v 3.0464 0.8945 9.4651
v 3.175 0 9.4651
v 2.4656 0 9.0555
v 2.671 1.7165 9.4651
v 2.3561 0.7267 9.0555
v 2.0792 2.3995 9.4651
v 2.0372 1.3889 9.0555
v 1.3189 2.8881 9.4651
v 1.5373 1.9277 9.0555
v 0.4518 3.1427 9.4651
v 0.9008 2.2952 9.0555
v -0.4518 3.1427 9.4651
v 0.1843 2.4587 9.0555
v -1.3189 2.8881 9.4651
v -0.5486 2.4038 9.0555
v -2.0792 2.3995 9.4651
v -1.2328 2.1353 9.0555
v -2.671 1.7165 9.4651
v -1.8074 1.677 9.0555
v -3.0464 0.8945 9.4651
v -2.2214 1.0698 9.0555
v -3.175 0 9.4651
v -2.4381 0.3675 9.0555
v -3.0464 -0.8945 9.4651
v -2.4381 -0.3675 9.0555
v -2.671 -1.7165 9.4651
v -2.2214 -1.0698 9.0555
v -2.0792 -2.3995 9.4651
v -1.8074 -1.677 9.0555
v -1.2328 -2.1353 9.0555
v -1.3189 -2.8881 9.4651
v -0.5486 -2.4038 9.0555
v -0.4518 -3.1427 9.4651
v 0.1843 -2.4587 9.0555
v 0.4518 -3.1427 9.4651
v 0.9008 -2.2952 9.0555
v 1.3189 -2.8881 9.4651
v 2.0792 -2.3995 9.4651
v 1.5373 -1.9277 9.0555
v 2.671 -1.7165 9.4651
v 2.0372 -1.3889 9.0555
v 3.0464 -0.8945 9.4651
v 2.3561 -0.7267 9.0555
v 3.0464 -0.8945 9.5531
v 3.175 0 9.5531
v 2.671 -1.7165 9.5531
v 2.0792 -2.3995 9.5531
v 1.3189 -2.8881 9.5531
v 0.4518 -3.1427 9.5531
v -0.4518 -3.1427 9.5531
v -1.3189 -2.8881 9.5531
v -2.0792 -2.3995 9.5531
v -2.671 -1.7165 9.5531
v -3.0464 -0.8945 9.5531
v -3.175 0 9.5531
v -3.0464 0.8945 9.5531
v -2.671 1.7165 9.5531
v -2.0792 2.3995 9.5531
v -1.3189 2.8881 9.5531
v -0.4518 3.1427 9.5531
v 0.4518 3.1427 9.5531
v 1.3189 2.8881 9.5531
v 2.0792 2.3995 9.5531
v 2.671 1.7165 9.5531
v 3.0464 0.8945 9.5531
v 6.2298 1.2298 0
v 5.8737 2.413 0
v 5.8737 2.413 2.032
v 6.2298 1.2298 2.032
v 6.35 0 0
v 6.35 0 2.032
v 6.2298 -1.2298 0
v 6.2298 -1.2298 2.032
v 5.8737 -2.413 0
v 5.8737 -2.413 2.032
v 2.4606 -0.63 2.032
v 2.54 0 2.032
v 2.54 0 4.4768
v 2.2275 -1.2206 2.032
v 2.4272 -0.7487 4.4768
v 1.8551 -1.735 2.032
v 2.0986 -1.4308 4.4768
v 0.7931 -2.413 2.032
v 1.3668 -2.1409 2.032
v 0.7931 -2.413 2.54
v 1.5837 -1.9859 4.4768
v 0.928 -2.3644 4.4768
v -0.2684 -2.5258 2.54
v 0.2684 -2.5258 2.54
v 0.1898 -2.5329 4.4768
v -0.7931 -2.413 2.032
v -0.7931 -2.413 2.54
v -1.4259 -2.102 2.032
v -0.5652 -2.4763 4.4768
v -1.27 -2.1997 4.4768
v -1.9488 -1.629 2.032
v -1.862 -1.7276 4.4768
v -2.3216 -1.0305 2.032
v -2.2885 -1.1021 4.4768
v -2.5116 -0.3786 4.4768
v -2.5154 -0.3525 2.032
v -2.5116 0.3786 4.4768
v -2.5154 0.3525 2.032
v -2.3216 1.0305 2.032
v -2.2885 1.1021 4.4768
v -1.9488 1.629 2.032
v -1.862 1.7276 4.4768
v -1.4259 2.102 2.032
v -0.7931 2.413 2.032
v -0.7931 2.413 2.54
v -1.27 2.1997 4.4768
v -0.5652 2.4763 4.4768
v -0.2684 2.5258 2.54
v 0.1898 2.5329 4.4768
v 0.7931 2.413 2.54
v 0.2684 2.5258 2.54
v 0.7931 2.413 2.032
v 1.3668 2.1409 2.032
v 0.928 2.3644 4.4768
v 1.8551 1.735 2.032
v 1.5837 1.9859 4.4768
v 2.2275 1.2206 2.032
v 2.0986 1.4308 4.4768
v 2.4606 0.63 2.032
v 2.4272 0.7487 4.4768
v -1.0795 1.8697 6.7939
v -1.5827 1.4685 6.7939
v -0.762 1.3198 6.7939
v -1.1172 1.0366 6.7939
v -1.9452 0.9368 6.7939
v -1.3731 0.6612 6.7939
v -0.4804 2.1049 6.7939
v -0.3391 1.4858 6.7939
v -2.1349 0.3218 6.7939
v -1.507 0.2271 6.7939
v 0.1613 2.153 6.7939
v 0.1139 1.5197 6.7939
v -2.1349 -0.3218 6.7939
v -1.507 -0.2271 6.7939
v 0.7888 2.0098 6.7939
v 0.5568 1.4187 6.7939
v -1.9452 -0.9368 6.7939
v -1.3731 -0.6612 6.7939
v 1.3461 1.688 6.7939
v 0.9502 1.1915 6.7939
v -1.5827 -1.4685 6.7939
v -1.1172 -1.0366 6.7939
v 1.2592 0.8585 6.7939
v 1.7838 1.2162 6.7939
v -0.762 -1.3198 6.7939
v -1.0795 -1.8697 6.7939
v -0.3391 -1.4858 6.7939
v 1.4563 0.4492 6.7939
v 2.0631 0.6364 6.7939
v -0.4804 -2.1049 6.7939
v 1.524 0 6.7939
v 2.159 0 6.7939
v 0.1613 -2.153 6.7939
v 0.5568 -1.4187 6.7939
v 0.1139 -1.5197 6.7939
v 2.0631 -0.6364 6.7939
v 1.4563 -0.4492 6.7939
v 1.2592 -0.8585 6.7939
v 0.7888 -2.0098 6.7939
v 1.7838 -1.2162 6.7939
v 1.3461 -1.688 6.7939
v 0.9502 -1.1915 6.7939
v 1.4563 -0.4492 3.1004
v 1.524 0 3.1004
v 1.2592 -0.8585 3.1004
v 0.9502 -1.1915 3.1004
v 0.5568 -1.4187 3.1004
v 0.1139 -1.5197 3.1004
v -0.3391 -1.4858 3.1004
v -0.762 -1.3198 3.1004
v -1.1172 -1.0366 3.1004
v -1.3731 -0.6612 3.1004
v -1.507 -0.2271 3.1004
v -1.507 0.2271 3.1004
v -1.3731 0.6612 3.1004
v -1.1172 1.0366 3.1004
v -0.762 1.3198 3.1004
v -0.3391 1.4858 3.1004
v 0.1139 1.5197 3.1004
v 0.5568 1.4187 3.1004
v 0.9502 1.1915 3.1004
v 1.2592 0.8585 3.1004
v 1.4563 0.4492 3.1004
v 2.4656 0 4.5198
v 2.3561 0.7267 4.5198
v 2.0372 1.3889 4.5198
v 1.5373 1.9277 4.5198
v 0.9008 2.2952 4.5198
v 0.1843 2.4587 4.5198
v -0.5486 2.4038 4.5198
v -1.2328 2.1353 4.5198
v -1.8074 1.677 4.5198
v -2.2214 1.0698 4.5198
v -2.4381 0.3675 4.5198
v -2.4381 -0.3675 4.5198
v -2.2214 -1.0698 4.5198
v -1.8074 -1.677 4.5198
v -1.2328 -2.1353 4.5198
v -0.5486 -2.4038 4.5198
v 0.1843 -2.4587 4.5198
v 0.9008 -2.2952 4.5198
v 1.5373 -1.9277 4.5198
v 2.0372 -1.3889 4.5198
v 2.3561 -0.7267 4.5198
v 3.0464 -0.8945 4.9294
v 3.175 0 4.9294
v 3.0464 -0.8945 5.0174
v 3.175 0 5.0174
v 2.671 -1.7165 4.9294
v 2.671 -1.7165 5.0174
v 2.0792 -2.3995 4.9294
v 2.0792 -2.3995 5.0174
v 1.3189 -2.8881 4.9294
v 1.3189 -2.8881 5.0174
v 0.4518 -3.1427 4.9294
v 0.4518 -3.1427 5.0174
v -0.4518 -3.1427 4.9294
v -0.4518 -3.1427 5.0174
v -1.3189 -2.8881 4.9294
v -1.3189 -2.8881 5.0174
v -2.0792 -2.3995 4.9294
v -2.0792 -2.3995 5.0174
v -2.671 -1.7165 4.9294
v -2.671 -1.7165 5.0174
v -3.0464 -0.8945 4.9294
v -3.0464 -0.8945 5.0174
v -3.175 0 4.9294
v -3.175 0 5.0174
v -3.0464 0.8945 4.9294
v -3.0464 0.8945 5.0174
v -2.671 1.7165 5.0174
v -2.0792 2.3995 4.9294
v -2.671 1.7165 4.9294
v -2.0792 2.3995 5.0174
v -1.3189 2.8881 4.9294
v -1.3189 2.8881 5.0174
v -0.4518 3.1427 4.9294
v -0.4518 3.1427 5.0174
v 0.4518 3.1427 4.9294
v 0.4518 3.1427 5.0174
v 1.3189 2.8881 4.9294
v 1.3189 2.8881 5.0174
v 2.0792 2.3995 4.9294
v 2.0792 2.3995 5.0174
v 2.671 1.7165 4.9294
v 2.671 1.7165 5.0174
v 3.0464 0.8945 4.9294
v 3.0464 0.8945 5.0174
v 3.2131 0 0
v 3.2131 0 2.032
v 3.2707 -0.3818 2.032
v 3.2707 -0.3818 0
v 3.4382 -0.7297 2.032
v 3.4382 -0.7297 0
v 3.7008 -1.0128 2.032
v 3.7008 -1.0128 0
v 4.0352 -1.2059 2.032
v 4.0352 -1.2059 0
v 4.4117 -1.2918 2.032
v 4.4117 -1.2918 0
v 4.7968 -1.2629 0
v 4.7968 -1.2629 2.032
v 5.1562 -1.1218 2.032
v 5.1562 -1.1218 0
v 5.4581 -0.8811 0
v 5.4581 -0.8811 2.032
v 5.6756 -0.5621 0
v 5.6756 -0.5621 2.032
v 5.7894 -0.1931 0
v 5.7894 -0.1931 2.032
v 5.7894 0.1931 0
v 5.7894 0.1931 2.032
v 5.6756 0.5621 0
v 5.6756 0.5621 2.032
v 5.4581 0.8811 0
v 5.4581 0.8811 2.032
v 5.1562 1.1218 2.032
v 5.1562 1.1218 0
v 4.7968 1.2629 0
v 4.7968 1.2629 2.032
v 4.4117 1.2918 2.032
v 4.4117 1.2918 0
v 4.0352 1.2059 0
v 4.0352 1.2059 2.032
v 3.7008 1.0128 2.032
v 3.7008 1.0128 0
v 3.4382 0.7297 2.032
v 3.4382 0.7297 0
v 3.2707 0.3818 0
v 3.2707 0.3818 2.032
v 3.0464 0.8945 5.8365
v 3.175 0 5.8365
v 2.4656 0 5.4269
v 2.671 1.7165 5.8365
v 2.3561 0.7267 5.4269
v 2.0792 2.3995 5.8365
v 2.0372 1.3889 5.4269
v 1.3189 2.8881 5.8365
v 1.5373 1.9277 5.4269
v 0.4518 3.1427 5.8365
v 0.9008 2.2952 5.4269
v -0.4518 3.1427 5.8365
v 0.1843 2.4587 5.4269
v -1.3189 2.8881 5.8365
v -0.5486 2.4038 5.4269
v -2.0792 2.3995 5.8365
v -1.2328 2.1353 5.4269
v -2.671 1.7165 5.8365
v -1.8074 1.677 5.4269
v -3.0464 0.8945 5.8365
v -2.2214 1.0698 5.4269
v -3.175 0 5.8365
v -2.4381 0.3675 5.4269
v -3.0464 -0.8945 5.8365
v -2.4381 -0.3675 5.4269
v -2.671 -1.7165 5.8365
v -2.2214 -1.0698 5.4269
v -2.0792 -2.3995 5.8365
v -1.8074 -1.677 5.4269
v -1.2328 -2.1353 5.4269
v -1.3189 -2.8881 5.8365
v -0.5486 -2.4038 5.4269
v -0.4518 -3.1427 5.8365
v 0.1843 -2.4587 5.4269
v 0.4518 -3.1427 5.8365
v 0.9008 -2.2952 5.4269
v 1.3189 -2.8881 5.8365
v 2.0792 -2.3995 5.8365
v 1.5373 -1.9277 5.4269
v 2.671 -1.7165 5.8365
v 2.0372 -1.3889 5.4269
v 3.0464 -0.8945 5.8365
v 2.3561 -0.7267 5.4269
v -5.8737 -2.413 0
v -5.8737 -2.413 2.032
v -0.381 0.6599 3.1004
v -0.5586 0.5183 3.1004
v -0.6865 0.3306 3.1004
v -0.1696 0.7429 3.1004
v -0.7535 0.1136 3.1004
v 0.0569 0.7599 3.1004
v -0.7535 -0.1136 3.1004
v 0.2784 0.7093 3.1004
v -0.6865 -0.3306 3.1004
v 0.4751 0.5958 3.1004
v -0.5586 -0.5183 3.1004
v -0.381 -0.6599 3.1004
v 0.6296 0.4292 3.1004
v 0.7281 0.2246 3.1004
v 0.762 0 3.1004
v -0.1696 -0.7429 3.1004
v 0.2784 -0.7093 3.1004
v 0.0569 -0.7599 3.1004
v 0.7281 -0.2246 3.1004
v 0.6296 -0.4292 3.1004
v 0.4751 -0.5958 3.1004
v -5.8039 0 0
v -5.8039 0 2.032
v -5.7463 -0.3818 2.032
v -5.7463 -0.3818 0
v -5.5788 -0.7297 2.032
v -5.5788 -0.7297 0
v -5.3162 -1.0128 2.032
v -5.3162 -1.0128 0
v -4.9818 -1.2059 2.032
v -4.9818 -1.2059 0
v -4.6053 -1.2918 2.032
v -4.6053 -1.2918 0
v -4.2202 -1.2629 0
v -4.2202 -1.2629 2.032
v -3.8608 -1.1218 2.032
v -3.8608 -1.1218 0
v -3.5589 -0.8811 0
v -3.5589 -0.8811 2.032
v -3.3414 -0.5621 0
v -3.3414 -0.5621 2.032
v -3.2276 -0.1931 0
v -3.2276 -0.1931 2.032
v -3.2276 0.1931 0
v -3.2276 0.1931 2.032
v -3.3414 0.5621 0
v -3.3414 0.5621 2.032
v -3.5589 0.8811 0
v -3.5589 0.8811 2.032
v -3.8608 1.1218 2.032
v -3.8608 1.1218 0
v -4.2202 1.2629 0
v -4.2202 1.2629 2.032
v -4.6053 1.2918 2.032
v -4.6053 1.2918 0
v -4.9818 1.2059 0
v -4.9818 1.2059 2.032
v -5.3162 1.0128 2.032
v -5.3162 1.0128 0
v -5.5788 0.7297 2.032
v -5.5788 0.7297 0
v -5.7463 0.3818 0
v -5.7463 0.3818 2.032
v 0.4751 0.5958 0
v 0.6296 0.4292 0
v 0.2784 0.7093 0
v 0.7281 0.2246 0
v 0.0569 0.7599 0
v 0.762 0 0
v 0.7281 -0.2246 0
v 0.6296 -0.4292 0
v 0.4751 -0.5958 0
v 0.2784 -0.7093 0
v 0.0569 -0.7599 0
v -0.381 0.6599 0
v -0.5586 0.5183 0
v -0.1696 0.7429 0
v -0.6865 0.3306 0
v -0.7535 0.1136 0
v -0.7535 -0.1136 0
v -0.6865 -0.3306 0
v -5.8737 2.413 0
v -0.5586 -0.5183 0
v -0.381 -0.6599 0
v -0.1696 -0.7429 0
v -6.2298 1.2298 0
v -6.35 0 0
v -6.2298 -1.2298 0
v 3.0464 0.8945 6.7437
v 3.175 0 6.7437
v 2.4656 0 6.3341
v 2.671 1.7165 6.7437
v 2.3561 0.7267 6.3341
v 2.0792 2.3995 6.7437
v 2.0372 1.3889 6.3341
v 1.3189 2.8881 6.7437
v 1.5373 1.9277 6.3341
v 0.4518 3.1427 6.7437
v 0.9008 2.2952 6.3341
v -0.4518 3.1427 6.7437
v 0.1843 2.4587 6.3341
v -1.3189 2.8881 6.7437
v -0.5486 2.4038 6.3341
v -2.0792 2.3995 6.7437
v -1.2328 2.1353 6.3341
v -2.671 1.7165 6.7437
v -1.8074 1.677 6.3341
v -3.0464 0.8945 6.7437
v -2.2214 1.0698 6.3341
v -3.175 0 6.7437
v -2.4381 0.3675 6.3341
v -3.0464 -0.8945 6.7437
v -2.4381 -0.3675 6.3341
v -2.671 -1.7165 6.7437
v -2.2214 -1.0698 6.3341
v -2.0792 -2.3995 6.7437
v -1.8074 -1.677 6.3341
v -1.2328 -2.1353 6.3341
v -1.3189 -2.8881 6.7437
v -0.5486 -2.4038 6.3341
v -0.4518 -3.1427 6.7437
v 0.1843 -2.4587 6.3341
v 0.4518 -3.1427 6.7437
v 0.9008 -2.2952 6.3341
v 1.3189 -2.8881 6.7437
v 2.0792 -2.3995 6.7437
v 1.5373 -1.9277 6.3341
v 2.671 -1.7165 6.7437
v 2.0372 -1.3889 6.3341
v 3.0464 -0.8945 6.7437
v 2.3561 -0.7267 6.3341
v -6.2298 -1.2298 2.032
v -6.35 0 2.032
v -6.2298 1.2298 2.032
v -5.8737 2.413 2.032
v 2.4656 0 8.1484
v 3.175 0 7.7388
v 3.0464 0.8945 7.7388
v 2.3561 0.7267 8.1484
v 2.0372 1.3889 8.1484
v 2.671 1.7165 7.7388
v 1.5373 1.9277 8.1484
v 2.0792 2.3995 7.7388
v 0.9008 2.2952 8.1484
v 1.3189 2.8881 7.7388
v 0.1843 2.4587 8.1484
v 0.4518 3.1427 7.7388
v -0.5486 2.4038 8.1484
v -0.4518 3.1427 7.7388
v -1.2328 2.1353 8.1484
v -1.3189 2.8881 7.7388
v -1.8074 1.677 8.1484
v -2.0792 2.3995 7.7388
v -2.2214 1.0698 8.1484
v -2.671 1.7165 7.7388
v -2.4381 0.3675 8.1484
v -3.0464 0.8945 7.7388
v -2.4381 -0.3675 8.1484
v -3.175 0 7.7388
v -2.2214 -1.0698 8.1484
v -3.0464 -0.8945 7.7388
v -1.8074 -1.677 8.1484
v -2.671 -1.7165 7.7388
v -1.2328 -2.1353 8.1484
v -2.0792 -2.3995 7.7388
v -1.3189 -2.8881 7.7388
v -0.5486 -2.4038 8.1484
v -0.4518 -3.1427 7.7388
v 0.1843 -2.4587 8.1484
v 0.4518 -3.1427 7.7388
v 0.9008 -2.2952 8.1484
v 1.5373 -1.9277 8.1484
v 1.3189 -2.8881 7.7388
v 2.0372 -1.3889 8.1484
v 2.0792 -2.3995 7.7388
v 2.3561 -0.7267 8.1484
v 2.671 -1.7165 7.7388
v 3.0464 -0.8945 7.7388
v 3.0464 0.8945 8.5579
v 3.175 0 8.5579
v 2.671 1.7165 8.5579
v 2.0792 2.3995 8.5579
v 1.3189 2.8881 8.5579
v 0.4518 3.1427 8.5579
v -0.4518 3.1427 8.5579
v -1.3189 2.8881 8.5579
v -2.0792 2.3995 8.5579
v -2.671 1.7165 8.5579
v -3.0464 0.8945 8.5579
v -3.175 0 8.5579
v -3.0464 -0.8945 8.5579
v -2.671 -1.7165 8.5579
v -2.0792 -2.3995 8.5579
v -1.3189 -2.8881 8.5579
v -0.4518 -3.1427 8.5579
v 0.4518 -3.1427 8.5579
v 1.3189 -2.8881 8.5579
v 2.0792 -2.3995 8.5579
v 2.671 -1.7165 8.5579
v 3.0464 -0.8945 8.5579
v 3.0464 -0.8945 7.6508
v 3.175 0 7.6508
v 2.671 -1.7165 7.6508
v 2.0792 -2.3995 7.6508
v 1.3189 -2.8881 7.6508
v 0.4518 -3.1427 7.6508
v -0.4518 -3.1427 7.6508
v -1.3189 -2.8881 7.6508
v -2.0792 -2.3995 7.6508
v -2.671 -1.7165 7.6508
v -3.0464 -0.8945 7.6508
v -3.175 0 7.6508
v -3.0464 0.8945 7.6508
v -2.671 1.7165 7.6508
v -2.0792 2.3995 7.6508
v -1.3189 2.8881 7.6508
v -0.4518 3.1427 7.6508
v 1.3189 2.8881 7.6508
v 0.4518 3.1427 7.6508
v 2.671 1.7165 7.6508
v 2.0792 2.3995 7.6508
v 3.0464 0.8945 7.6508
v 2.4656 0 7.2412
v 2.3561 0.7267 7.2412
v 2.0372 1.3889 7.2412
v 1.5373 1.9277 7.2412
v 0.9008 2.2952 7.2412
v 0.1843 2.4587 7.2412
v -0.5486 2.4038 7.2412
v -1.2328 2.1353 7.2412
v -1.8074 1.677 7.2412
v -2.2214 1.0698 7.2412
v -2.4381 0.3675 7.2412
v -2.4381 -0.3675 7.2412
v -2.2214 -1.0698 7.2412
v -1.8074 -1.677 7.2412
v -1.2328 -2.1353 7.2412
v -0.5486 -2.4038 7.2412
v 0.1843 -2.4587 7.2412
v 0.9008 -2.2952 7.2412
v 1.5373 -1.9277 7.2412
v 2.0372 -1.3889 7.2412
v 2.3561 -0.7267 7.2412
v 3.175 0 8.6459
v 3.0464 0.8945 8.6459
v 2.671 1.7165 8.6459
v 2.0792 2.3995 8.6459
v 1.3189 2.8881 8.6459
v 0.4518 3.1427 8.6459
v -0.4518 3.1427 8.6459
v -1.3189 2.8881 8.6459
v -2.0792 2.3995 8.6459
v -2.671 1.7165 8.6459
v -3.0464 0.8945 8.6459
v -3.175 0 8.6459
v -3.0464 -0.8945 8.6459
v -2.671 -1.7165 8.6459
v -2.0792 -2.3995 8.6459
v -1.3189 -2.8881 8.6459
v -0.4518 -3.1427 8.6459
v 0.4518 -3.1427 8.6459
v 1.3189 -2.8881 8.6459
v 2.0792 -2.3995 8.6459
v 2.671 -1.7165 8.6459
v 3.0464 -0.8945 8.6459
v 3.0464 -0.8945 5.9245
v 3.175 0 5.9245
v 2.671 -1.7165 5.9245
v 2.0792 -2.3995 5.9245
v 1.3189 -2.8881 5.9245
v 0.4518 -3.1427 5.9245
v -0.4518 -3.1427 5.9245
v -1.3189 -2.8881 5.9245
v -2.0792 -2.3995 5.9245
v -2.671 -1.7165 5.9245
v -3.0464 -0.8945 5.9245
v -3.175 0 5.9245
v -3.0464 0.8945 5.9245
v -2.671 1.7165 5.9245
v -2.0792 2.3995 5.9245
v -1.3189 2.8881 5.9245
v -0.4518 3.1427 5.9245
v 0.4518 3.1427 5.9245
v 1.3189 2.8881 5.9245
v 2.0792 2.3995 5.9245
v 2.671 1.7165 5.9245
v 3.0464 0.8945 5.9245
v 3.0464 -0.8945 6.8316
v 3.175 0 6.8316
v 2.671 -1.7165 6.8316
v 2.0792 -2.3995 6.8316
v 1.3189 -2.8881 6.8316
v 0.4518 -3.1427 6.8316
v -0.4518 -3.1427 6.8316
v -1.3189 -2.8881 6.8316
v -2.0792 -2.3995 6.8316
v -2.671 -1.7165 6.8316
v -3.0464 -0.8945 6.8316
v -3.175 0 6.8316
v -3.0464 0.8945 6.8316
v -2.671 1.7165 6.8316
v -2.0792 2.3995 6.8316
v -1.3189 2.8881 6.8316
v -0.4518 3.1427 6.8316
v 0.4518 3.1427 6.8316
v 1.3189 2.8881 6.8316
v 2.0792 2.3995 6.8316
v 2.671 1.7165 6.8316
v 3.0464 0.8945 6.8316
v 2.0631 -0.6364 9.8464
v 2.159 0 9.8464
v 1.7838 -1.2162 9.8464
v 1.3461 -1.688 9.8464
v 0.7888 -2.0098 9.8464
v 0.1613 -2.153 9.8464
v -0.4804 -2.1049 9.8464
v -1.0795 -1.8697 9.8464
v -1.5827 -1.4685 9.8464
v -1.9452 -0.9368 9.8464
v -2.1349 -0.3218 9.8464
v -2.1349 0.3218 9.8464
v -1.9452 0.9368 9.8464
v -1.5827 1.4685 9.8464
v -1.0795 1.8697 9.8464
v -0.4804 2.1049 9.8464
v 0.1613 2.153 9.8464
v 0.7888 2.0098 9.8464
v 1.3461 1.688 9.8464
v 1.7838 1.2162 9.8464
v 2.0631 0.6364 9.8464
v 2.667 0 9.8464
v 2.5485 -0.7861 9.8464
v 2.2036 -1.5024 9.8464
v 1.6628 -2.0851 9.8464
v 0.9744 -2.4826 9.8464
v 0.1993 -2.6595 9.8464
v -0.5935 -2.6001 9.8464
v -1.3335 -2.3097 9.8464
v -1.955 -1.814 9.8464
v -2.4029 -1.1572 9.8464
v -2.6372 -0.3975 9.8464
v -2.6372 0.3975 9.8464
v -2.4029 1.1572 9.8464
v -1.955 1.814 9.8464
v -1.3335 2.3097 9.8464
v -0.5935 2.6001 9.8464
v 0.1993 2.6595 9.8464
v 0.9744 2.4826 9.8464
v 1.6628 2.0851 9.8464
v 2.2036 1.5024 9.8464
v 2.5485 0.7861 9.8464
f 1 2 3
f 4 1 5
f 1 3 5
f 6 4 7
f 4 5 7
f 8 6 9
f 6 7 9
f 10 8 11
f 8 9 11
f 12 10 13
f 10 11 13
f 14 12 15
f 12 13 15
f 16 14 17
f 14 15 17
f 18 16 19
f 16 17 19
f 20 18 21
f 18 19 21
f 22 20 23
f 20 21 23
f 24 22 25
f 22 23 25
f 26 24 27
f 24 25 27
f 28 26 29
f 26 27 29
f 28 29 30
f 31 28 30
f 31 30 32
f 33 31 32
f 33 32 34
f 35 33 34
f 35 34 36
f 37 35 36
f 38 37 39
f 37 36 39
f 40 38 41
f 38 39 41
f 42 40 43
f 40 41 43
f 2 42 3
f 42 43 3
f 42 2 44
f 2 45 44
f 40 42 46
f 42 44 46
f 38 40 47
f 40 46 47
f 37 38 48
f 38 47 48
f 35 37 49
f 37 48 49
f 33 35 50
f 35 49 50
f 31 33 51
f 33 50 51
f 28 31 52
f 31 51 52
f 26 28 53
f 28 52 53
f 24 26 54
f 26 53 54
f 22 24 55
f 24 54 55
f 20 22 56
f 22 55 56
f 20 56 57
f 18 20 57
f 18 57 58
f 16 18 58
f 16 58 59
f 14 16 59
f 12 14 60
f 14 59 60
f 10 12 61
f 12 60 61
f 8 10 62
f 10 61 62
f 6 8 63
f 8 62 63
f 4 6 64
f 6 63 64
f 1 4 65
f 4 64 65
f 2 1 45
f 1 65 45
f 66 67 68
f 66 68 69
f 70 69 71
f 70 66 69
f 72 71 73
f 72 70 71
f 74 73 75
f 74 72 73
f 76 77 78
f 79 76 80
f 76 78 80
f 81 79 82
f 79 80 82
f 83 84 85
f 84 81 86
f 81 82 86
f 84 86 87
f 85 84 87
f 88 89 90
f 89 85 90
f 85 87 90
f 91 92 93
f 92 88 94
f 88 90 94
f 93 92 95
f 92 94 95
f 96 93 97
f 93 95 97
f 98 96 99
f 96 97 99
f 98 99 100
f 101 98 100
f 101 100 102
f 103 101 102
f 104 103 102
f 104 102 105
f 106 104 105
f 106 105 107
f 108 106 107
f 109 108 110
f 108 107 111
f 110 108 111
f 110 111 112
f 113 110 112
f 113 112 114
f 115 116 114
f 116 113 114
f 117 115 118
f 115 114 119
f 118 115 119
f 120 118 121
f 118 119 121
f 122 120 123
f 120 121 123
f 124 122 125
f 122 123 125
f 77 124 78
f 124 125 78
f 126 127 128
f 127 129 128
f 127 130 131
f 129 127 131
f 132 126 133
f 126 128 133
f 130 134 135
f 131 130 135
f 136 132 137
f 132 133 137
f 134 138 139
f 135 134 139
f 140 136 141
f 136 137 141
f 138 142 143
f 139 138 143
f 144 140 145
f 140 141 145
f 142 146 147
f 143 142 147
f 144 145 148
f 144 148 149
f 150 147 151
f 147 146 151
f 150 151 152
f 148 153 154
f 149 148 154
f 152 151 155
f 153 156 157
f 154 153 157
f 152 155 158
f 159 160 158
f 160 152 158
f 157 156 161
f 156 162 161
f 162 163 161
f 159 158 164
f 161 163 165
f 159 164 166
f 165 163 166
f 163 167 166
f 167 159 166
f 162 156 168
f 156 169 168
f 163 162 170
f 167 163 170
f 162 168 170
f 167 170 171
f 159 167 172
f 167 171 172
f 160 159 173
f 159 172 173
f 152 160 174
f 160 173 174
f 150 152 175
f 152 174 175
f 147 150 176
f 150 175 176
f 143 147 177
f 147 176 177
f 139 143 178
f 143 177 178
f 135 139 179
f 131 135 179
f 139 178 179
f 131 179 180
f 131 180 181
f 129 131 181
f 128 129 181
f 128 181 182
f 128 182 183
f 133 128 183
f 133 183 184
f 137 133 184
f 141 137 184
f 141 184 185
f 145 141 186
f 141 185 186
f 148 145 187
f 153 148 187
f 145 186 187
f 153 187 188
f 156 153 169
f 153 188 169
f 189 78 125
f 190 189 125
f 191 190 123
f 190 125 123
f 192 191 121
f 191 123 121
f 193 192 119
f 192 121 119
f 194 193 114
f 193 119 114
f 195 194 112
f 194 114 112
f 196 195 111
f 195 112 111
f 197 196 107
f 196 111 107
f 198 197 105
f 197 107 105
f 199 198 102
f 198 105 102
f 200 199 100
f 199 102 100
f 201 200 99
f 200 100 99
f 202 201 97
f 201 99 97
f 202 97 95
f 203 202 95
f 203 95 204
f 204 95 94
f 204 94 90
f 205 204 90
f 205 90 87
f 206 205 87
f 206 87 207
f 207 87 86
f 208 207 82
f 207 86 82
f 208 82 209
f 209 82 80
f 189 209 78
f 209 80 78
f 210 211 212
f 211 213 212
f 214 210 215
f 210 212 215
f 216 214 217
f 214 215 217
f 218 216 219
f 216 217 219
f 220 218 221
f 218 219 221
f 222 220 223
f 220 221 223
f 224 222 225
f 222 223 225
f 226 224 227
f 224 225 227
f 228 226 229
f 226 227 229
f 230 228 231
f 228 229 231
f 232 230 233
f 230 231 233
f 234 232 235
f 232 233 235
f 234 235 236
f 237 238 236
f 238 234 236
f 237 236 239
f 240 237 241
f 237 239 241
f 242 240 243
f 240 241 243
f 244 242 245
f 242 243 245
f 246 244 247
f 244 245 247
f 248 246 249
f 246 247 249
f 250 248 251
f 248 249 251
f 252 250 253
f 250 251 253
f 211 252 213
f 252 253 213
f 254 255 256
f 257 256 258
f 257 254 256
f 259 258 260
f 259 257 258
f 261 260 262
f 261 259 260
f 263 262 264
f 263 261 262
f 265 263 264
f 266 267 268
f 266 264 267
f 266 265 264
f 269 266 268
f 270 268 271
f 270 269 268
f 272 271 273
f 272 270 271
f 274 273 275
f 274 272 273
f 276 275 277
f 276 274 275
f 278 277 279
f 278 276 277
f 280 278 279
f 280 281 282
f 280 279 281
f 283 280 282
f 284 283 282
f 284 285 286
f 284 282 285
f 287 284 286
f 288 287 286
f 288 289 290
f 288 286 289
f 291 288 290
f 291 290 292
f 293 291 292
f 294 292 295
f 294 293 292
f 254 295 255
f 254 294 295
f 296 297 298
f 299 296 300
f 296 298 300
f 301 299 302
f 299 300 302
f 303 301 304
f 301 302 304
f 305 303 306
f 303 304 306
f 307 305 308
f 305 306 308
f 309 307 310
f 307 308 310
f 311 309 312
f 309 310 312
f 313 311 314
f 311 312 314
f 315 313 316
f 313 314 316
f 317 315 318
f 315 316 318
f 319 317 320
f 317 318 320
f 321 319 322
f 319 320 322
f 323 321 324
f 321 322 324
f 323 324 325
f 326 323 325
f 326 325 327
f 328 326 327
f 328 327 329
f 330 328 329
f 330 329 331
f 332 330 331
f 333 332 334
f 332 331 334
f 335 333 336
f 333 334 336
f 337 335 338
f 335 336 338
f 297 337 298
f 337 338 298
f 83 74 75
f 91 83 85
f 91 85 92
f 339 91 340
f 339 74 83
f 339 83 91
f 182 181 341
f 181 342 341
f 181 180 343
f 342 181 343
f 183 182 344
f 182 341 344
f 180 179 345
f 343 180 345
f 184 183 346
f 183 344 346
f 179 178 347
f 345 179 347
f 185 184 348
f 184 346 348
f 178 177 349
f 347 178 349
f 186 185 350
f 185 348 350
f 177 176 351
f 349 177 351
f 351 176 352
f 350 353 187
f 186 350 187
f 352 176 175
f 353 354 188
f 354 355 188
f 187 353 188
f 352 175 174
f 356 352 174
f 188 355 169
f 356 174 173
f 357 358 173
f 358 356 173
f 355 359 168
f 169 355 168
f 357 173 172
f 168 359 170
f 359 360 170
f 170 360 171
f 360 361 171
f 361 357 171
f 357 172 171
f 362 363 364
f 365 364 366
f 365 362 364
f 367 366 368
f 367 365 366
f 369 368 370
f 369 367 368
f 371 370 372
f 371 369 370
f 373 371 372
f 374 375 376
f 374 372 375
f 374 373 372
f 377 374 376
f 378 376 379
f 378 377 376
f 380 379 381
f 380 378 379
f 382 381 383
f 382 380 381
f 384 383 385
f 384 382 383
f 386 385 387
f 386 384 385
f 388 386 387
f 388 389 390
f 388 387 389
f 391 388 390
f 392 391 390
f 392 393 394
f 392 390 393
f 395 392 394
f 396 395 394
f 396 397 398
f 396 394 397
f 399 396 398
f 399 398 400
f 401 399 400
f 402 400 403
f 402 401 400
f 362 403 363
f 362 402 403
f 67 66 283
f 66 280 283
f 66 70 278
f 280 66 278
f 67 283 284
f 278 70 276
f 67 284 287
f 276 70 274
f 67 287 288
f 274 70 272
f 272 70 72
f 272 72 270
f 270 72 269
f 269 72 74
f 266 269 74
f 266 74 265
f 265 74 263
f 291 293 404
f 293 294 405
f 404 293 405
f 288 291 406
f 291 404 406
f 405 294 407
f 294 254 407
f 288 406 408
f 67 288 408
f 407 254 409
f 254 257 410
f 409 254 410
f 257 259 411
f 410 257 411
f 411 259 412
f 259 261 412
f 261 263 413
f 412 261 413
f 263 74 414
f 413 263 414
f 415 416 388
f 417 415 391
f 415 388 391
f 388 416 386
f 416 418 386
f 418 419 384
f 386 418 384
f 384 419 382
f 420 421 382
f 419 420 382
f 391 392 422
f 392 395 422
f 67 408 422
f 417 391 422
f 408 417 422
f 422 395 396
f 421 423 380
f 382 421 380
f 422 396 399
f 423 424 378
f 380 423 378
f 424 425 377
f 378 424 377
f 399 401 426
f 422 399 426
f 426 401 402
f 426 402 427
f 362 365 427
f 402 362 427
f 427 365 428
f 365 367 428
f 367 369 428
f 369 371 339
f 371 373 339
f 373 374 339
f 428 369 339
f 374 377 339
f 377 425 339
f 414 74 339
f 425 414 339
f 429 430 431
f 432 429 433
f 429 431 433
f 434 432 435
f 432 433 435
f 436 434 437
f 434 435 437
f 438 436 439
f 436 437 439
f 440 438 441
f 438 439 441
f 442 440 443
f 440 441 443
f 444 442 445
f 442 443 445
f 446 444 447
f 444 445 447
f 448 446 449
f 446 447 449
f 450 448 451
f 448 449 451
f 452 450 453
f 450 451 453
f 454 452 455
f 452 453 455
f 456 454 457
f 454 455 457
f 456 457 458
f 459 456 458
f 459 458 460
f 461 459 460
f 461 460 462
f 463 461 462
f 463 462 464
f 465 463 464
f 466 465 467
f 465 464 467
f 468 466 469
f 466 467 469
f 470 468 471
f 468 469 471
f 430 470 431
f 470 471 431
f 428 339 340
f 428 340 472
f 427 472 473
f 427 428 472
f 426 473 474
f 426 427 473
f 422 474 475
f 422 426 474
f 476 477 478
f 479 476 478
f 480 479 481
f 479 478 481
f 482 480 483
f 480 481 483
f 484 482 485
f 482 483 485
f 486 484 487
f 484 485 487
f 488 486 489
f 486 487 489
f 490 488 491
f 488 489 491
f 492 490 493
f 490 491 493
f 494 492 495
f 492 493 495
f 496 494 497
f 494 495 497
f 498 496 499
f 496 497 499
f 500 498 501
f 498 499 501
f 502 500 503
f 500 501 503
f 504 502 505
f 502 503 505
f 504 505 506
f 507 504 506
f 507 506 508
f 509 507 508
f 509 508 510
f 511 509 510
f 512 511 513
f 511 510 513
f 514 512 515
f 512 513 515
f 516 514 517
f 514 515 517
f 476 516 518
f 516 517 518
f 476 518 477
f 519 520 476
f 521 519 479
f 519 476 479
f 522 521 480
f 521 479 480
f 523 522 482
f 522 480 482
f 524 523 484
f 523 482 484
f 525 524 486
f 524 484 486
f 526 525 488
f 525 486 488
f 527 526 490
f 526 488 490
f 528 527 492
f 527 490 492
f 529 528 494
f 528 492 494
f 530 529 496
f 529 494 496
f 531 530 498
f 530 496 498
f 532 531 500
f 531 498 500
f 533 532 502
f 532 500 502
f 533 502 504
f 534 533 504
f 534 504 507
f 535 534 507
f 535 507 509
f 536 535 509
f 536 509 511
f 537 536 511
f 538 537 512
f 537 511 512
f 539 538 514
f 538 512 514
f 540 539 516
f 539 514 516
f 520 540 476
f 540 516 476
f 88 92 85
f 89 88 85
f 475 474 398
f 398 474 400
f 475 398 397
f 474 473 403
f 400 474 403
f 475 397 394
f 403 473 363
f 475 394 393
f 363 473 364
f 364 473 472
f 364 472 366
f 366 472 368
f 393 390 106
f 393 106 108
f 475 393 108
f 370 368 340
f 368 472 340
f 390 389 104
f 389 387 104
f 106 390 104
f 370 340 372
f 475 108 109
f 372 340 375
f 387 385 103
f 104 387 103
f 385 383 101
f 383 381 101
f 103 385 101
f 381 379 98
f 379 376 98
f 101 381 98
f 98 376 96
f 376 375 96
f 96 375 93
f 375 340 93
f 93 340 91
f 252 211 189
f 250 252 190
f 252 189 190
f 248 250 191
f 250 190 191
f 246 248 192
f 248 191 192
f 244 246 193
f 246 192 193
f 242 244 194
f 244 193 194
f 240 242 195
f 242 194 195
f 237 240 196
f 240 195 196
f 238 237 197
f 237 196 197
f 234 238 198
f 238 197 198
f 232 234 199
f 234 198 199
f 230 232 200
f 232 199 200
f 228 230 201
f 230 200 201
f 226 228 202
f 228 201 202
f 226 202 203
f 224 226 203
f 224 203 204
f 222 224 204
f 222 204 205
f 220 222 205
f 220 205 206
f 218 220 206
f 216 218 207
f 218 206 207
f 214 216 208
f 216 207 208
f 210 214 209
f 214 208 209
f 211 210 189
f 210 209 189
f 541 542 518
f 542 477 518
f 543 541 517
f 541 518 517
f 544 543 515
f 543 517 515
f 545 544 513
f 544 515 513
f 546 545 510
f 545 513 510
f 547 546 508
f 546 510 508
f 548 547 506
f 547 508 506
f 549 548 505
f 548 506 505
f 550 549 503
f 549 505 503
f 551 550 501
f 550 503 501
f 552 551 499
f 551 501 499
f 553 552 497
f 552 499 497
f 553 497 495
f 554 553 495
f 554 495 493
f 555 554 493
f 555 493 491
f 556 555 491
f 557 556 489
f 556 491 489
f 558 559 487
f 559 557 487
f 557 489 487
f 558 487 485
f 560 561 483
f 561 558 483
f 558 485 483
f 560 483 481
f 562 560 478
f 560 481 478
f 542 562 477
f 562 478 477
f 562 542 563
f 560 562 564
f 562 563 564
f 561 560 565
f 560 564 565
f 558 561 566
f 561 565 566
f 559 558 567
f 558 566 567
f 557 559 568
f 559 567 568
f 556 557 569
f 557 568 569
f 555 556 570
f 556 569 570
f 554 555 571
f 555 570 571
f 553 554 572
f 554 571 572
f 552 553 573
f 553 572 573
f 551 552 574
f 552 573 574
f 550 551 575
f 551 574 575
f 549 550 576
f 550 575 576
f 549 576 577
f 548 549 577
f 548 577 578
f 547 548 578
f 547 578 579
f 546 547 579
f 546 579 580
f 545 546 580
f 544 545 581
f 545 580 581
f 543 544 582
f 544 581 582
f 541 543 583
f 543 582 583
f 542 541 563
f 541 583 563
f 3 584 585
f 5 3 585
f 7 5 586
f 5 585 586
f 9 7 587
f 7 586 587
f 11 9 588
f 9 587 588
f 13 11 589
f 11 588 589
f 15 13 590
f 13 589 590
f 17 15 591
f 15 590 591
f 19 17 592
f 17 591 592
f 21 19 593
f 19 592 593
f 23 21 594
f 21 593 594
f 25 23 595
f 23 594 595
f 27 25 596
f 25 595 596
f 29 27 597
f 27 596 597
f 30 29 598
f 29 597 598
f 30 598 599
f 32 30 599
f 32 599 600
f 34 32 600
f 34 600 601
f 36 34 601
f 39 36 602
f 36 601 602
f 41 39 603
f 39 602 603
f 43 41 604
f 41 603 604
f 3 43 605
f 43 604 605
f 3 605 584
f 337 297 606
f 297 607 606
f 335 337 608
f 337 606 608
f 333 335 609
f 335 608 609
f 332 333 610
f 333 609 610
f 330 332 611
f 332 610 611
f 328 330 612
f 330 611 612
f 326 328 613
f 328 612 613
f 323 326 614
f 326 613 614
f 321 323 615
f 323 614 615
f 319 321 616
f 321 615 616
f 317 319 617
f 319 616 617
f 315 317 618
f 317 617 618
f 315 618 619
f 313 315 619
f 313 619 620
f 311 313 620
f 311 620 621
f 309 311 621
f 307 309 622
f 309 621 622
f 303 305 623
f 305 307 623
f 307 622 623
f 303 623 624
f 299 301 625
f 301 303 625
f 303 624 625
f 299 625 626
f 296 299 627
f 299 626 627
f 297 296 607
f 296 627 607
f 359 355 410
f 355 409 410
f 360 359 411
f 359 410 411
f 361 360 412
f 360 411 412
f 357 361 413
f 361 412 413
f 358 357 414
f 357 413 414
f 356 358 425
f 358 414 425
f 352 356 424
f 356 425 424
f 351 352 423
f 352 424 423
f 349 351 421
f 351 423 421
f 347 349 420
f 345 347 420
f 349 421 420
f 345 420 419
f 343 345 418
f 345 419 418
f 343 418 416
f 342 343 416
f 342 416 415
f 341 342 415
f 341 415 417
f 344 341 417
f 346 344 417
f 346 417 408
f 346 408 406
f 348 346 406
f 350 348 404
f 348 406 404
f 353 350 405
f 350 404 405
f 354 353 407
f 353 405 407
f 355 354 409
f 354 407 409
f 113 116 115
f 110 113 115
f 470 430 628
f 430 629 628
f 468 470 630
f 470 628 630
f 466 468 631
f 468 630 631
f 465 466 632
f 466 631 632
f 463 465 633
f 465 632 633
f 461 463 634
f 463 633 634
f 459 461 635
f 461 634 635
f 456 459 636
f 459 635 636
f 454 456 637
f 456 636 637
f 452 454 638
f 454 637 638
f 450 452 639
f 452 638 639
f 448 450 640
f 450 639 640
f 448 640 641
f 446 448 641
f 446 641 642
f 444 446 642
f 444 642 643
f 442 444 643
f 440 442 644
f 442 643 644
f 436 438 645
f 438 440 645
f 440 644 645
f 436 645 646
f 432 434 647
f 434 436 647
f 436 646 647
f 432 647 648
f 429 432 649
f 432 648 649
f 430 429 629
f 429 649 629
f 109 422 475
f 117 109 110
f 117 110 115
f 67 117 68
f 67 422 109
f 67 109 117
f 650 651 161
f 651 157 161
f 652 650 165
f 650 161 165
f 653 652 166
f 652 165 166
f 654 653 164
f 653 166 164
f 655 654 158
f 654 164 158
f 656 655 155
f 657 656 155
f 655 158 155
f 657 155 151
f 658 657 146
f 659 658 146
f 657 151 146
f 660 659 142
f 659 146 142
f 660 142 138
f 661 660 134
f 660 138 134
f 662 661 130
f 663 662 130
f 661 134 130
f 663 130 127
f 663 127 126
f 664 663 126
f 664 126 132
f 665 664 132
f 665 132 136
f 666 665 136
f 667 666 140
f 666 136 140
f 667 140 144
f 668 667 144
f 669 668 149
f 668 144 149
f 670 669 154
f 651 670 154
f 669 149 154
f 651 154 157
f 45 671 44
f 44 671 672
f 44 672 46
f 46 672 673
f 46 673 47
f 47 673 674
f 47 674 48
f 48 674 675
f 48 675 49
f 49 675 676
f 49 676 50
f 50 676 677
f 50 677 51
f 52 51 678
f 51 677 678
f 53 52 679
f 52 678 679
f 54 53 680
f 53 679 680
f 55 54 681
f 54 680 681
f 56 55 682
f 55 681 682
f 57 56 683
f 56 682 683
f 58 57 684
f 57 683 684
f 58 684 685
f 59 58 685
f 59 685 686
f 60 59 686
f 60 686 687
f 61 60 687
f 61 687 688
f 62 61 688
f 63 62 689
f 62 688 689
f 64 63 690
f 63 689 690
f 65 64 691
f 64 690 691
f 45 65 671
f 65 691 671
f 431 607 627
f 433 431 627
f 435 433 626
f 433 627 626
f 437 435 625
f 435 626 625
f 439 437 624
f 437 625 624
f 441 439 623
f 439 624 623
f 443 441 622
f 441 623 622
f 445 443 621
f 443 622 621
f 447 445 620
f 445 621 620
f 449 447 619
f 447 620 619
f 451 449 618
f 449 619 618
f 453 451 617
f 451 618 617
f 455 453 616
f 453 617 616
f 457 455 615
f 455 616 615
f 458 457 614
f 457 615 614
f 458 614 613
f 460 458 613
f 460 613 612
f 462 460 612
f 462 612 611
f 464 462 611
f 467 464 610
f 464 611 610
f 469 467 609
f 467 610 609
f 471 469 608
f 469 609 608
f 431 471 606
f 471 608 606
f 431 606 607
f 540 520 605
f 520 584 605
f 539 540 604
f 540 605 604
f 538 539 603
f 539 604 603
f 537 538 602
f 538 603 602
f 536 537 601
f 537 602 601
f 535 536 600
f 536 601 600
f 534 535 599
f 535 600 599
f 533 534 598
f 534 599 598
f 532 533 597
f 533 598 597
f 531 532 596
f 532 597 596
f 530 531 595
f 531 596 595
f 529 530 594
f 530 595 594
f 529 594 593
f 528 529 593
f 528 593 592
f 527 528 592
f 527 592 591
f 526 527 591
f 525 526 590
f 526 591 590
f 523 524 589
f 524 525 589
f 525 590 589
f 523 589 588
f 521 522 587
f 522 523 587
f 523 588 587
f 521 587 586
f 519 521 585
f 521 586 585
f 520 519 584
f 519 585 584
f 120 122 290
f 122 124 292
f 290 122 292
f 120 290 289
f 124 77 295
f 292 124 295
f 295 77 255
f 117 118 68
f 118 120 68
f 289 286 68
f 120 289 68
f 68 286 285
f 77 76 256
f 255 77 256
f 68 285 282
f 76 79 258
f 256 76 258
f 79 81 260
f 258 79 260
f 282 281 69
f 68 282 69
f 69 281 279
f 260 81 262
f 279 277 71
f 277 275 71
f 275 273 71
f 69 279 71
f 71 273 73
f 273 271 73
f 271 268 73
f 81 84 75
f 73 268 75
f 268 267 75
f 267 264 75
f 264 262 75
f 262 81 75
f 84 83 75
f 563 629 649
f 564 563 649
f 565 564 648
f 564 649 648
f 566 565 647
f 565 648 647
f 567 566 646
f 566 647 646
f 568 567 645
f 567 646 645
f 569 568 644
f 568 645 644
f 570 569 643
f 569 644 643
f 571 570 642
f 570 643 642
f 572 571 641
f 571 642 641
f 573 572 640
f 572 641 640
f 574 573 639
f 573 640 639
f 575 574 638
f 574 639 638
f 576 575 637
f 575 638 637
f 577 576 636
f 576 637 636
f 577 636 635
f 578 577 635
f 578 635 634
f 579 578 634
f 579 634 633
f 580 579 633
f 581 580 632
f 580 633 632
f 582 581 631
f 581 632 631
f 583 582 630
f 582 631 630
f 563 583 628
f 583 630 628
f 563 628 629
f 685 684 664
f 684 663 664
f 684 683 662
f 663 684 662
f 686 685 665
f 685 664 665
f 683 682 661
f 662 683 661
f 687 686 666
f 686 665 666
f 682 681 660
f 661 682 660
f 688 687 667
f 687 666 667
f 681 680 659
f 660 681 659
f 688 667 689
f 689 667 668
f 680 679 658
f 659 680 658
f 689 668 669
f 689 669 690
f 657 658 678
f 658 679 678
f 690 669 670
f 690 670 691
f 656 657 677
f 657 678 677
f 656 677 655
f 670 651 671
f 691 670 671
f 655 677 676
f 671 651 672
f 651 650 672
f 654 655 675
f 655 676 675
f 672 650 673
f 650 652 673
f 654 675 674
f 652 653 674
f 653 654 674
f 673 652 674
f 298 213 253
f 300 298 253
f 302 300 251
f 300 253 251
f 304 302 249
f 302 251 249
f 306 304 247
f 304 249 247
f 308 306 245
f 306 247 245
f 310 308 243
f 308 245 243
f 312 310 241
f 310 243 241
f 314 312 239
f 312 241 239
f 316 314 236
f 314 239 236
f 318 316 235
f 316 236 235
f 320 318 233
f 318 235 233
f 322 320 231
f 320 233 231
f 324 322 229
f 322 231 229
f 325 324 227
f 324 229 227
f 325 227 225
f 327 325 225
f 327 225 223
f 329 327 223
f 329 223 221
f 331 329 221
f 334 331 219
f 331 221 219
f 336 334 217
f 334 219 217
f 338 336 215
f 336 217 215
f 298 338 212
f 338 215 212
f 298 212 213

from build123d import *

# Parameters (mm, degrees)
SKETCH5_OUTSIDE_W   = 23.578
SKETCH5_OUTSIDE_H   = 23.578
SKETCH5_OUTSIDE_R   = 1.2954
CE_00_500_355_DEPTH = 2.54
LPATTERN4_COUNT     = 6
LPATTERN4_PITCH     = 0.907142857


with BuildPart() as part:
    # Sketch1 → Revolve1 (revolve)
    with BuildSketch(Plane(origin=(0, 0, 0), x_dir=(0, 0, -1), z_dir=(1, 0, 0)), mode=Mode.PRIVATE) as revolve1_sk:
        Polygon((-2.032, 2.54), (-4.512366142, 2.54), (-4.878983563, 3.175), (-9.553072205, 3.175), (-9.846366142, 2.667), (-9.846366142, 2.159), (-6.793879368, 2.159), (-6.793879368, 1.524), (-3.100370371, 1.524), (-3.100370371, 0.762), (0, 0.762), (0, 8.255), (-2.032, 8.255), align=None)
    revolve(revolve1_sk.sketch.rotate(Axis((0, 0, 6.793879368), (0, 0, -1)), 90), axis=Axis((0, 0, 6.793879368), (0, 0, -1)))

    # Sketch5 outside → CE-00 500 355 (cut)
    # profile 1 of 3: a face of its own
    with BuildSketch(Plane.XY):
        Rectangle(SKETCH5_OUTSIDE_W, SKETCH5_OUTSIDE_H)
        with BuildLine():
            Line((5.873664189, -2.413), (-5.873664189, -2.413))
            ThreePointArc((-5.873664189, -2.413), (-6.35, 0), (-5.873664189, 2.413))
            Line((-5.873664189, 2.413), (5.873664189, 2.413))
            ThreePointArc((5.873664189, 2.413), (6.35, 0), (5.873664189, -2.413))
        make_face(mode=Mode.SUBTRACT)
    # profile 2 of 3: a face of its own
    with BuildSketch(Plane.XY):
        with Locations(Location((-4.5085, 0, 0), (0, 0, 180))):
            Circle(SKETCH5_OUTSIDE_R)
    # profile 3 of 3: a face of its own
    with BuildSketch(Plane.XY):
        with Locations(Location((4.5085, 0, 0), (0, 0, 180))):
            Circle(SKETCH5_OUTSIDE_R)
    extrude(amount=CE_00_500_355_DEPTH, mode=Mode.SUBTRACT)

    # Sketch4 → Cut-Revolve1 (revolve, cut)
    with BuildSketch(Plane(origin=(0, 0, 0), x_dir=(0, 0, -1), z_dir=(1, 0, 0)), mode=Mode.PRIVATE) as cut_revolve1_sk:
        Polygon((-9.523742812, 3.2766), (-9.055506686, 2.465591241), (-8.587270561, 3.2766), align=None)
    cut_revolve1 = revolve(cut_revolve1_sk.sketch.rotate(Axis((0, 0, -0.492318307), (0, 0, 1)), 270), axis=Axis((0, 0, -0.492318307), (0, 0, 1)), mode=Mode.SUBTRACT)

    # LPattern4: Cut-Revolve1 ×6
    with Locations(*[(0, 0, -i * LPATTERN4_PITCH) for i in range(1, LPATTERN4_COUNT)]):
        add(cut_revolve1, mode=Mode.SUBTRACT)


solid = part.part
